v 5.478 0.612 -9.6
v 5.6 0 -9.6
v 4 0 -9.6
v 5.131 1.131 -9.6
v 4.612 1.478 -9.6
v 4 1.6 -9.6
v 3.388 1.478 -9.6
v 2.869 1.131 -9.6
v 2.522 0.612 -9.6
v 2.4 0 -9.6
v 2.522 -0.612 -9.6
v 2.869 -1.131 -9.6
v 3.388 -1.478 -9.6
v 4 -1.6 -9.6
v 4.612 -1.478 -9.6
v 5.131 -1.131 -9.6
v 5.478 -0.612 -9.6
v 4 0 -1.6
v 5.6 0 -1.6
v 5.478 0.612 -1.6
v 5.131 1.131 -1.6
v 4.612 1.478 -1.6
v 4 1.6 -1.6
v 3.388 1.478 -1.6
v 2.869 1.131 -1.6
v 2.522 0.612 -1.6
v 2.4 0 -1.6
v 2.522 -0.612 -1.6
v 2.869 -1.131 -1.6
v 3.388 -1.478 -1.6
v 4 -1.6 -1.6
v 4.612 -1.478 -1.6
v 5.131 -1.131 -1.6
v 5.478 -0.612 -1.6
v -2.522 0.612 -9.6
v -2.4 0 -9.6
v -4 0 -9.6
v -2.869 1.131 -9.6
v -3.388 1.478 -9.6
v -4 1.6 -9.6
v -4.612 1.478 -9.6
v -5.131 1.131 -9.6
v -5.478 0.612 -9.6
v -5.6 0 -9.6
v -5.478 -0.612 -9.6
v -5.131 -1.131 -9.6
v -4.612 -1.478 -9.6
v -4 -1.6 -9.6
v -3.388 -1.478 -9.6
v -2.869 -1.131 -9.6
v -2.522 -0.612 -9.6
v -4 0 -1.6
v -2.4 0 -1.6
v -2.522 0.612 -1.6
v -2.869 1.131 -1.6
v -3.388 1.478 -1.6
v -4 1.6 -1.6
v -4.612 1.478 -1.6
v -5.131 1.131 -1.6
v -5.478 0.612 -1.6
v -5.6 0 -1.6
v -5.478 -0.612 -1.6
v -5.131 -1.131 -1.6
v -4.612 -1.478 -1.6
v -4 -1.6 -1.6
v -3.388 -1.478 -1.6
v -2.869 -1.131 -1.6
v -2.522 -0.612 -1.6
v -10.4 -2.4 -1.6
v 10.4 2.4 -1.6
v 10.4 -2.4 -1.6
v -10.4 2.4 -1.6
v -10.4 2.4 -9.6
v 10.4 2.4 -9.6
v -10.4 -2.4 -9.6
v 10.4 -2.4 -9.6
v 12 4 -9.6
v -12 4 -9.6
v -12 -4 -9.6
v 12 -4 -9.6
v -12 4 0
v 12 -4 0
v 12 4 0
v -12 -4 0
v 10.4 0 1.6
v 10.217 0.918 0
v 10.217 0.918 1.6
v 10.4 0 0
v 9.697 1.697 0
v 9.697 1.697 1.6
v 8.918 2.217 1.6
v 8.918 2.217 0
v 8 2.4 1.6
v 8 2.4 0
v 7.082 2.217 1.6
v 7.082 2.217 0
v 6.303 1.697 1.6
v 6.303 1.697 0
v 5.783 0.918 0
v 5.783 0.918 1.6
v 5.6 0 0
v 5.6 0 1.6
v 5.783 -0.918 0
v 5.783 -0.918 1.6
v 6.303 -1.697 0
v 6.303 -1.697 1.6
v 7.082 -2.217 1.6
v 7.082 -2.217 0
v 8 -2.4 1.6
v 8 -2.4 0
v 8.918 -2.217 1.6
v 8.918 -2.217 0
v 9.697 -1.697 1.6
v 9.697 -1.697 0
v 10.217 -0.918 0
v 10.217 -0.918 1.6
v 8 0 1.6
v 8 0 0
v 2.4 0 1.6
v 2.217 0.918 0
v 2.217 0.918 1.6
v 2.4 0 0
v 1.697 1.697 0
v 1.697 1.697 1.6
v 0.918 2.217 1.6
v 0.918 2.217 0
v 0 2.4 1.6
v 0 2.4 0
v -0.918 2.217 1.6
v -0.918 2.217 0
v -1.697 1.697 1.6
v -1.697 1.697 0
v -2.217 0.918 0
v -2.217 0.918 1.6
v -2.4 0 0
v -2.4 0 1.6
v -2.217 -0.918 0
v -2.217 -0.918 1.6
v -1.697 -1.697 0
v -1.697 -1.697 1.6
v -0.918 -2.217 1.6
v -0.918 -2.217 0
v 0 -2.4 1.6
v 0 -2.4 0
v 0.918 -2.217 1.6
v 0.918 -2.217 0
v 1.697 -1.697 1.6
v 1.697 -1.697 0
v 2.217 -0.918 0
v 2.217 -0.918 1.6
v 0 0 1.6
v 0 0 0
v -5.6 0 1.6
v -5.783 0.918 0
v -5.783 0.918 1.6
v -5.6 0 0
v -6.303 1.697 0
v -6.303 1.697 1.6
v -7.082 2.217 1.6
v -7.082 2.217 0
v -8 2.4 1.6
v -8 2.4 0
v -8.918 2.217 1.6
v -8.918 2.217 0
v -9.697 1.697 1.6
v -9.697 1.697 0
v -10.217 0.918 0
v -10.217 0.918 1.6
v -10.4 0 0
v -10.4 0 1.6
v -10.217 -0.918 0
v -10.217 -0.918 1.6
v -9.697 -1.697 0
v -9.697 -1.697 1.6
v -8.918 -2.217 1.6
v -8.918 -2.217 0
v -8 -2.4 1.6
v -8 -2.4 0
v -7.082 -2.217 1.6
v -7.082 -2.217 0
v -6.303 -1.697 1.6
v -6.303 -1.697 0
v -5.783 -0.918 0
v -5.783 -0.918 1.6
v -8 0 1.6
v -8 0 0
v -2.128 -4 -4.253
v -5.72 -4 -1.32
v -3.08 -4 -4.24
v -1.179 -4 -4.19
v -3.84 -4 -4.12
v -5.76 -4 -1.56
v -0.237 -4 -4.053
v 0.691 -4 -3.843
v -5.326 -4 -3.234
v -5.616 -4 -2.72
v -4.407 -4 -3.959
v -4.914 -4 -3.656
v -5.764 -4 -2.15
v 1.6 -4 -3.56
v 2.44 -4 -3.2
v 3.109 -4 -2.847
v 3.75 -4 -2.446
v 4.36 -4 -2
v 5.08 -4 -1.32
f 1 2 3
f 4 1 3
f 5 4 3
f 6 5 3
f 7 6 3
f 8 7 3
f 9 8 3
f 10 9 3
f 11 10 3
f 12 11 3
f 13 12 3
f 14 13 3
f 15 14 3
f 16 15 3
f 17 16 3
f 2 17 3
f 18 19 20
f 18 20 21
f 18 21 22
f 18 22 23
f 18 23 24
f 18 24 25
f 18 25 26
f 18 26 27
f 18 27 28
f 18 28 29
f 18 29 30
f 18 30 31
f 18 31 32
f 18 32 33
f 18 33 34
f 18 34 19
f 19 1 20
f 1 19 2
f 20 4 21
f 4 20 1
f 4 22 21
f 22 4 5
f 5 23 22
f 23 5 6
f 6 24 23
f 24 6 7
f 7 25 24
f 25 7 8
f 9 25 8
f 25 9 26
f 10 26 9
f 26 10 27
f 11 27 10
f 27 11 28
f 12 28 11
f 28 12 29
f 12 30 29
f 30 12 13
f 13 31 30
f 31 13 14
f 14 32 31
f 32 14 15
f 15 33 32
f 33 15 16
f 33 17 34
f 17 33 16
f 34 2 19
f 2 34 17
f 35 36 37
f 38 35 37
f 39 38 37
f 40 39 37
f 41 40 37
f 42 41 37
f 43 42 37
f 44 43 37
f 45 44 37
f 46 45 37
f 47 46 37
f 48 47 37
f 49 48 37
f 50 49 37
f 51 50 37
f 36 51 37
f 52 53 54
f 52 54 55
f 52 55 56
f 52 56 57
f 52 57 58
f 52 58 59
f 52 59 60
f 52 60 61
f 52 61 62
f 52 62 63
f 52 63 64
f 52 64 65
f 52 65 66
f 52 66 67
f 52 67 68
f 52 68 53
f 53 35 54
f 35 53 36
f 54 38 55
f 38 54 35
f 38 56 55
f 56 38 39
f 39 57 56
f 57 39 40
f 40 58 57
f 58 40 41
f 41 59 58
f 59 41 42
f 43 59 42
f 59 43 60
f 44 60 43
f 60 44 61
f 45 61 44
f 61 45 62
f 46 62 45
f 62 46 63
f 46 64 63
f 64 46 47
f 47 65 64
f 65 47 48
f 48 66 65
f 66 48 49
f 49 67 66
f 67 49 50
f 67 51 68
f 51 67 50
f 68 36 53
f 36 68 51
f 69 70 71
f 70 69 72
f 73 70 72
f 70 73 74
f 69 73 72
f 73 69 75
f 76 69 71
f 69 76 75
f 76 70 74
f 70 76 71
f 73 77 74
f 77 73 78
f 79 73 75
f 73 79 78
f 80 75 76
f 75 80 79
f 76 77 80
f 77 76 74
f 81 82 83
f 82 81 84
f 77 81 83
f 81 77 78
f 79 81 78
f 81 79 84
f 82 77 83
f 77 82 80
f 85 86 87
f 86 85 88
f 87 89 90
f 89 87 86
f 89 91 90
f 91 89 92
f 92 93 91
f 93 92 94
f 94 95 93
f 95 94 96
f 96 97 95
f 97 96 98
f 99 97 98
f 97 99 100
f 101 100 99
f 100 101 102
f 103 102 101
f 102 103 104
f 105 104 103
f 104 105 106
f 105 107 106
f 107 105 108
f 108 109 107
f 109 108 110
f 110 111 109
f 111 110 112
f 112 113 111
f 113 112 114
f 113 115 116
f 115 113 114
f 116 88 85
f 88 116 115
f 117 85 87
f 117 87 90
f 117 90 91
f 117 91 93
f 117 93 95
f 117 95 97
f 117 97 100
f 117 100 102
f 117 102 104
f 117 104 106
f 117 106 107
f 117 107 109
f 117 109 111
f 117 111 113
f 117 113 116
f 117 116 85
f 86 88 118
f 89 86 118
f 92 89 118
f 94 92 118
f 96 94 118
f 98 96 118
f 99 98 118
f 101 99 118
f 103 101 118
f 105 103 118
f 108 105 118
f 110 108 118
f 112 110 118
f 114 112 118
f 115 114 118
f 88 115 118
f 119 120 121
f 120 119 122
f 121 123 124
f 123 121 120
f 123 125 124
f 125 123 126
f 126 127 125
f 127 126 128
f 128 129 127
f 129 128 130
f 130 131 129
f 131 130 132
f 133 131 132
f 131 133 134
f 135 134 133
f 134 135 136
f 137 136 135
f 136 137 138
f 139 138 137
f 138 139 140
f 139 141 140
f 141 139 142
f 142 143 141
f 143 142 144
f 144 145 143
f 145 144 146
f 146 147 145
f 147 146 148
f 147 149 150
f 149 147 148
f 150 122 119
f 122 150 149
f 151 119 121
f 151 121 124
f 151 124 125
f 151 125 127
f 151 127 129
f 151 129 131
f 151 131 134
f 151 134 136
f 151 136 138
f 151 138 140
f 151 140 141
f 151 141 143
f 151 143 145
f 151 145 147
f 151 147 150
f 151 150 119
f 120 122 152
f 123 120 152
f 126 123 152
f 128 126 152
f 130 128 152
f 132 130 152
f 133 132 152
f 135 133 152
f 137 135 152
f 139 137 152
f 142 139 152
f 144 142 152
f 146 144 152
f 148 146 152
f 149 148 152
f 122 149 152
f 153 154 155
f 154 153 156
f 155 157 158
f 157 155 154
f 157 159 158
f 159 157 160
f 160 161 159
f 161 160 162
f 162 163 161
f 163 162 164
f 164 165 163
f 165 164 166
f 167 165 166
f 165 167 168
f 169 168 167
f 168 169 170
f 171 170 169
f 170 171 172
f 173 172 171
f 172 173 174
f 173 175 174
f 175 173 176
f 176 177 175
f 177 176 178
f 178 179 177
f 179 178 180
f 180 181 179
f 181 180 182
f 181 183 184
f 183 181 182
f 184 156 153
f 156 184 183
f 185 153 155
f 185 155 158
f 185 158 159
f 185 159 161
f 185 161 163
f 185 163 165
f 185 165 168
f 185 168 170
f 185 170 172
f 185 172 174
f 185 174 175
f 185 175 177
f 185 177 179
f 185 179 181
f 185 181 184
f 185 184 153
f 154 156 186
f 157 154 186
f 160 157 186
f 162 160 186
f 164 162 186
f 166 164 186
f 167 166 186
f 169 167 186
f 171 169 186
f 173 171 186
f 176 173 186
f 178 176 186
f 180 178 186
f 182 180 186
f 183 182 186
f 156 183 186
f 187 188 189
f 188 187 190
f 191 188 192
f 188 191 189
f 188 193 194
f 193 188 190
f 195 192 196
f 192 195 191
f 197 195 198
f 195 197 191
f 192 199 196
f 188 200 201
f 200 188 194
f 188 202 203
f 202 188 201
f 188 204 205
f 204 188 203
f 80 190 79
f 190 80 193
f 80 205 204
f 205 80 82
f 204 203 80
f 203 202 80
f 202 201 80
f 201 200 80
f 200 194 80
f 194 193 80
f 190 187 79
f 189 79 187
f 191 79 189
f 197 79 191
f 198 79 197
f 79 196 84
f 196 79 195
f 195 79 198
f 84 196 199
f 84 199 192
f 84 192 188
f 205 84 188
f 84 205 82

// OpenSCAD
// file: ../p/4-4edge.scad
use <../lib.scad>
function ldraw_lib__4_4edge() = [
// 0 Circle 1.0
// 0 Name: 4-4edge.dat
// 0 Author: James Jessiman
// 0 !LDRAW_ORG Primitive UPDATE 2017-01
// 0 !LICENSE Licensed under CC BY 2.0 and CC BY 4.0 : see CAreadme.txt
// 
// 0 BFC CERTIFY CCW
  [0,"BFC","CERTIFY"],
  [0,"BFC","CCW"],
// 
// 0 !HISTORY 1998-12-15 [PTadmin] Official Update 1998-10
// 0 !HISTORY 2005-12-28 [PTadmin] Official Update 2005-01
// 0 !HISTORY 2007-06-24 [PTadmin] Header formatted for Contributor Agreement
// 0 !HISTORY 2008-07-01 [PTadmin] Official Update 2008-01
// 0 !HISTORY 2017-01-15 [Steffen] BFCed
// 0 !HISTORY 2017-12-30 [PTadmin] Official Update 2017-01
// 
// 
// 2 24 1 0 0 0.9239 0 0.3827
  [2,24,1,0,0,0.9239,0,0.3827],
// 2 24 0.9239 0 0.3827 0.7071 0 0.7071
  [2,24,0.9239,0,0.3827,0.7071,0,0.7071],
// 2 24 0.7071 0 0.7071 0.3827 0 0.9239
  [2,24,0.7071,0,0.7071,0.3827,0,0.9239],
// 2 24 0.3827 0 0.9239 0 0 1
  [2,24,0.3827,0,0.9239,0,0,1],
// 2 24 0 0 1 -0.3827 0 0.9239
  [2,24,0,0,1,-0.3827,0,0.9239],
// 2 24 -0.3827 0 0.9239 -0.7071 0 0.7071
  [2,24,-0.3827,0,0.9239,-0.7071,0,0.7071],
// 2 24 -0.7071 0 0.7071 -0.9239 0 0.3827
  [2,24,-0.7071,0,0.7071,-0.9239,0,0.3827],
// 2 24 -0.9239 0 0.3827 -1 0 -0
  [2,24,-0.9239,0,0.3827,-1,0,-0],
// 2 24 -1 0 -0 -0.9239 0 -0.3827
  [2,24,-1,0,-0,-0.9239,0,-0.3827],
// 2 24 -0.9239 0 -0.3827 -0.7071 0 -0.7071
  [2,24,-0.9239,0,-0.3827,-0.7071,0,-0.7071],
// 2 24 -0.7071 0 -0.7071 -0.3827 0 -0.9239
  [2,24,-0.7071,0,-0.7071,-0.3827,0,-0.9239],
// 2 24 -0.3827 0 -0.9239 0 0 -1
  [2,24,-0.3827,0,-0.9239,0,0,-1],
// 2 24 0 0 -1 0.3827 0 -0.9239
  [2,24,0,0,-1,0.3827,0,-0.9239],
// 2 24 0.3827 0 -0.9239 0.7071 0 -0.7071
  [2,24,0.3827,0,-0.9239,0.7071,0,-0.7071],
// 2 24 0.7071 0 -0.7071 0.9239 0 -0.3827
  [2,24,0.7071,0,-0.7071,0.9239,0,-0.3827],
// 2 24 0.9239 0 -0.3827 1 0 0
  [2,24,0.9239,0,-0.3827,1,0,0],
];
module ldraw_lib__4_4edge(step=0, col=false, unit=2/5, alt=false, line=0.2, solid=!$preview)
    makepoly(ldraw_lib__4_4edge(), step=step, col=col, unit=unit, alt=alt, line=line, solid=solid);
ldraw_lib__4_4edge(line=0.2);
// file: ../p/4-4disc.scad
use <../lib.scad>
function ldraw_lib__4_4disc() = [
// 0 Disc 1.0
// 0 Name: 4-4disc.dat
// 0 Author: James Jessiman
// 0 !LDRAW_ORG Primitive UPDATE 2002-02
// 0 !LICENSE Licensed under CC BY 2.0 and CC BY 4.0 : see CAreadme.txt
// 
// 0 BFC CERTIFY CCW
  [0,"BFC","CERTIFY"],
  [0,"BFC","CCW"],
// 
// 0 !HISTORY 1998-12-15 [PTadmin] Official Update 1998-10
// 0 !HISTORY 2002-03-23 [sbliss] Added BFC statement
// 0 !HISTORY 2002-04-25 [PTadmin] Official Update 2002-02
// 0 !HISTORY 2007-06-24 [PTadmin] Header formatted for Contributor Agreement
// 0 !HISTORY 2008-07-01 [PTadmin] Official Update 2008-01
// 
// 
// 3 16 0 0 0 1 0 0 0.9239 0 0.3827
  [3,16,0,0,0,1,0,0,0.9239,0,0.3827],
// 3 16 0 0 0 0.9239 0 0.3827 0.7071 0 0.7071
  [3,16,0,0,0,0.9239,0,0.3827,0.7071,0,0.7071],
// 3 16 0 0 0 0.7071 0 0.7071 0.3827 0 0.9239
  [3,16,0,0,0,0.7071,0,0.7071,0.3827,0,0.9239],
// 3 16 0 0 0 0.3827 0 0.9239 0 0 1
  [3,16,0,0,0,0.3827,0,0.9239,0,0,1],
// 3 16 0 0 0 0 0 1 -0.3827 0 0.9239
  [3,16,0,0,0,0,0,1,-0.3827,0,0.9239],
// 3 16 0 0 0 -0.3827 0 0.9239 -0.7071 0 0.7071
  [3,16,0,0,0,-0.3827,0,0.9239,-0.7071,0,0.7071],
// 3 16 0 0 0 -0.7071 0 0.7071 -0.9239 0 0.3827
  [3,16,0,0,0,-0.7071,0,0.7071,-0.9239,0,0.3827],
// 3 16 0 0 0 -0.9239 0 0.3827 -1 0 -0
  [3,16,0,0,0,-0.9239,0,0.3827,-1,0,-0],
// 3 16 0 0 0 -1 0 -0 -0.9239 0 -0.3827
  [3,16,0,0,0,-1,0,-0,-0.9239,0,-0.3827],
// 3 16 0 0 0 -0.9239 0 -0.3827 -0.7071 0 -0.7071
  [3,16,0,0,0,-0.9239,0,-0.3827,-0.7071,0,-0.7071],
// 3 16 0 0 0 -0.7071 0 -0.7071 -0.3827 0 -0.9239
  [3,16,0,0,0,-0.7071,0,-0.7071,-0.3827,0,-0.9239],
// 3 16 0 0 0 -0.3827 0 -0.9239 0 0 -1
  [3,16,0,0,0,-0.3827,0,-0.9239,0,0,-1],
// 3 16 0 0 0 0 0 -1 0.3827 0 -0.9239
  [3,16,0,0,0,0,0,-1,0.3827,0,-0.9239],
// 3 16 0 0 0 0.3827 0 -0.9239 0.7071 0 -0.7071
  [3,16,0,0,0,0.3827,0,-0.9239,0.7071,0,-0.7071],
// 3 16 0 0 0 0.7071 0 -0.7071 0.9239 0 -0.3827
  [3,16,0,0,0,0.7071,0,-0.7071,0.9239,0,-0.3827],
// 3 16 0 0 0 0.9239 0 -0.3827 1 0 0
  [3,16,0,0,0,0.9239,0,-0.3827,1,0,0],
// 0
];
module ldraw_lib__4_4disc(step=0, col=false, unit=2/5, alt=false, line=0.2, solid=!$preview)
    makepoly(ldraw_lib__4_4disc(), step=step, col=col, unit=unit, alt=alt, line=line, solid=solid);
ldraw_lib__4_4disc(line=0.2);
// file: ../p/4-4cyli.scad
use <../lib.scad>
$fa=1; $fs=0.2;
function ldraw_lib__4_4cyli(realsolid=false) = [
// 0 Cylinder 1.0
// 0 Name: 4-4cyli.dat
// 0 Author: James Jessiman
// 0 !LDRAW_ORG Primitive UPDATE 2005-01
// 0 !LICENSE Licensed under CC BY 2.0 and CC BY 4.0 : see CAreadme.txt
// 
// 0 BFC CERTIFY CCW
  [0,"BFC","CERTIFY"],
  [0,"BFC","CCW"],
// 
// 0 !HISTORY 1998-12-15 [PTadmin] Official Update 1998-10
// 0 !HISTORY 2002-03-23 [sbliss] Added BFC statement; merged headers from files in distributions LDraw 0.27 and Complete.
// 0 !HISTORY 2002-04-25 [PTadmin] Official Update 2002-02
// 0 !HISTORY 2004-12-14 [guyvivan] BFC CCW
// 0 !HISTORY 2005-12-28 [PTadmin] Official Update 2005-01
// 0 !HISTORY 2007-06-24 [PTadmin] Header formatted for Contributor Agreement
// 0 !HISTORY 2008-07-01 [PTadmin] Official Update 2008-01
// 
// 
// 4 16 1 1 0 0.9239 1 0.3827 0.9239 0 0.3827 1 0 0
  [4,16,1,1,0,0.9239,1,0.3827,0.9239,0,0.3827,1,0,0],
// 5 24 1 0 0 1 1 0 0.9239 0 0.3827 0.9239 0 -0.3827
  [5,24,1,0,0,1,1,0,0.9239,0,0.3827,0.9239,0,-0.3827],
// 4 16 0.9239 1 0.3827 0.7071 1 0.7071 0.7071 0 0.7071 0.9239 0 0.3827
  [4,16,0.9239,1,0.3827,0.7071,1,0.7071,0.7071,0,0.7071,0.9239,0,0.3827],
// 5 24 0.9239 0 0.3827 0.9239 1 0.3827 0.7071 0 0.7071 1 0 0
  [5,24,0.9239,0,0.3827,0.9239,1,0.3827,0.7071,0,0.7071,1,0,0],
// 4 16 0.7071 1 0.7071 0.3827 1 0.9239 0.3827 0 0.9239 0.7071 0 0.7071
  [4,16,0.7071,1,0.7071,0.3827,1,0.9239,0.3827,0,0.9239,0.7071,0,0.7071],
// 5 24 0.7071 0 0.7071 0.7071 1 0.7071 0.3827 0 0.9239 0.9239 0 0.3827
  [5,24,0.7071,0,0.7071,0.7071,1,0.7071,0.3827,0,0.9239,0.9239,0,0.3827],
// 4 16 0.3827 1 0.9239 0 1 1 0 0 1 0.3827 0 0.9239
  [4,16,0.3827,1,0.9239,0,1,1,0,0,1,0.3827,0,0.9239],
// 5 24 0.3827 0 0.9239 0.3827 1 0.9239 0 0 1 0.7071 0 0.7071
  [5,24,0.3827,0,0.9239,0.3827,1,0.9239,0,0,1,0.7071,0,0.7071],
// 4 16 0 1 1 -0.3827 1 0.9239 -0.3827 0 0.9239 0 0 1
  [4,16,0,1,1,-0.3827,1,0.9239,-0.3827,0,0.9239,0,0,1],
// 5 24 0 0 1 0 1 1 -0.3827 0 0.9239 0.3827 0 0.9239
  [5,24,0,0,1,0,1,1,-0.3827,0,0.9239,0.3827,0,0.9239],
// 4 16 -0.3827 1 0.9239 -0.7071 1 0.7071 -0.7071 0 0.7071 -0.3827 0 0.9239
  [4,16,-0.3827,1,0.9239,-0.7071,1,0.7071,-0.7071,0,0.7071,-0.3827,0,0.9239],
// 5 24 -0.3827 0 0.9239 -0.3827 1 0.9239 -0.7071 0 0.7071 0 0 1
  [5,24,-0.3827,0,0.9239,-0.3827,1,0.9239,-0.7071,0,0.7071,0,0,1],
// 4 16 -0.7071 1 0.7071 -0.9239 1 0.3827 -0.9239 0 0.3827 -0.7071 0 0.7071
  [4,16,-0.7071,1,0.7071,-0.9239,1,0.3827,-0.9239,0,0.3827,-0.7071,0,0.7071],
// 5 24 -0.7071 0 0.7071 -0.7071 1 0.7071 -0.9239 0 0.3827 -0.3827 0 0.9239
  [5,24,-0.7071,0,0.7071,-0.7071,1,0.7071,-0.9239,0,0.3827,-0.3827,0,0.9239],
// 4 16 -0.9239 1 0.3827 -1 1 0 -1 0 0 -0.9239 0 0.3827
  [4,16,-0.9239,1,0.3827,-1,1,0,-1,0,0,-0.9239,0,0.3827],
// 5 24 -0.9239 0 0.3827 -0.9239 1 0.3827 -1 0 0 -0.7071 0 0.7071
  [5,24,-0.9239,0,0.3827,-0.9239,1,0.3827,-1,0,0,-0.7071,0,0.7071],
// 4 16 -1 1 0 -0.9239 1 -0.3827 -0.9239 0 -0.3827 -1 0 0
  [4,16,-1,1,0,-0.9239,1,-0.3827,-0.9239,0,-0.3827,-1,0,0],
// 5 24 -1 0 0 -1 1 0 -0.9239 0 -0.3827 -0.9239 0 0.3827
  [5,24,-1,0,0,-1,1,0,-0.9239,0,-0.3827,-0.9239,0,0.3827],
// 4 16 -0.9239 1 -0.3827 -0.7071 1 -0.7071 -0.7071 0 -0.7071 -0.9239 0 -0.3827
  [4,16,-0.9239,1,-0.3827,-0.7071,1,-0.7071,-0.7071,0,-0.7071,-0.9239,0,-0.3827],
// 5 24 -0.9239 0 -0.3827 -0.9239 1 -0.3827 -0.7071 0 -0.7071 -1 0 0
  [5,24,-0.9239,0,-0.3827,-0.9239,1,-0.3827,-0.7071,0,-0.7071,-1,0,0],
// 4 16 -0.7071 1 -0.7071 -0.3827 1 -0.9239 -0.3827 0 -0.9239 -0.7071 0 -0.7071
  [4,16,-0.7071,1,-0.7071,-0.3827,1,-0.9239,-0.3827,0,-0.9239,-0.7071,0,-0.7071],
// 5 24 -0.7071 0 -0.7071 -0.7071 1 -0.7071 -0.3827 0 -0.9239 -0.9239 0 -0.3827
  [5,24,-0.7071,0,-0.7071,-0.7071,1,-0.7071,-0.3827,0,-0.9239,-0.9239,0,-0.3827],
// 4 16 -0.3827 1 -0.9239 0 1 -1 0 0 -1 -0.3827 0 -0.9239
  [4,16,-0.3827,1,-0.9239,0,1,-1,0,0,-1,-0.3827,0,-0.9239],
// 5 24 -0.3827 0 -0.9239 -0.3827 1 -0.9239 0 0 -1 -0.7071 0 -0.7071
  [5,24,-0.3827,0,-0.9239,-0.3827,1,-0.9239,0,0,-1,-0.7071,0,-0.7071],
// 4 16 0 1 -1 0.3827 1 -0.9239 0.3827 0 -0.9239 0 0 -1
  [4,16,0,1,-1,0.3827,1,-0.9239,0.3827,0,-0.9239,0,0,-1],
// 5 24 0 0 -1 0 1 -1 0.3827 0 -0.9239 -0.3827 0 -0.9239
  [5,24,0,0,-1,0,1,-1,0.3827,0,-0.9239,-0.3827,0,-0.9239],
// 4 16 0.3827 1 -0.9239 0.7071 1 -0.7071 0.7071 0 -0.7071 0.3827 0 -0.9239
  [4,16,0.3827,1,-0.9239,0.7071,1,-0.7071,0.7071,0,-0.7071,0.3827,0,-0.9239],
// 5 24 0.3827 0 -0.9239 0.3827 1 -0.9239 0.7071 0 -0.7071 0 0 -1
  [5,24,0.3827,0,-0.9239,0.3827,1,-0.9239,0.7071,0,-0.7071,0,0,-1],
// 4 16 0.7071 1 -0.7071 0.9239 1 -0.3827 0.9239 0 -0.3827 0.7071 0 -0.7071
  [4,16,0.7071,1,-0.7071,0.9239,1,-0.3827,0.9239,0,-0.3827,0.7071,0,-0.7071],
// 5 24 0.7071 0 -0.7071 0.7071 1 -0.7071 0.9239 0 -0.3827 0.3827 0 -0.9239
  [5,24,0.7071,0,-0.7071,0.7071,1,-0.7071,0.9239,0,-0.3827,0.3827,0,-0.9239],
// 4 16 0.9239 1 -0.3827 1 1 0 1 0 0 0.9239 0 -0.3827
  [4,16,0.9239,1,-0.3827,1,1,0,1,0,0,0.9239,0,-0.3827],
// 5 24 0.9239 0 -0.3827 0.9239 1 -0.3827 1 0 0 0.7071 0 -0.7071
  [5,24,0.9239,0,-0.3827,0.9239,1,-0.3827,1,0,0,0.7071,0,-0.7071],
// 0
];
module ldraw_lib__4_4cyli(step=0, col=false, unit=2/5, alt=false, line=0.2, solid=!$preview)
    makepoly(ldraw_lib__4_4cyli(solid), step=step, col=col, unit=unit, alt=alt, line=line, solid=solid);
ldraw_lib__4_4cyli(line=0.2);
// file: ../p/stud3.scad
use <../lib.scad>
use <4-4cyli.scad>
use <4-4disc.scad>
use <4-4edge.scad>
function ldraw_lib__stud3() = [
// 0 Stud Tube Solid
// 0 Name: stud3.dat
// 0 Author: James Jessiman
// 0 !LDRAW_ORG Primitive UPDATE 2012-01
// 0 !LICENSE Licensed under CC BY 4.0 : see CAreadme.txt
// 
// 0 BFC CERTIFY CCW
  [0,"BFC","CERTIFY"],
  [0,"BFC","CCW"],
// 
// 0 !HISTORY 2002-04-04 [sbliss] Modified for BFC compliance
// 0 !HISTORY 2002-04-25 [PTadmin] Official Update 2002-02
// 0 !HISTORY 2007-06-24 [PTadmin] Header formatted for Contributor Agreement
// 0 !HISTORY 2008-07-01 [PTadmin] Official Update 2008-01
// 0 !HISTORY 2012-02-16 [Philo] Changed to CCW
// 0 !HISTORY 2012-03-30 [PTadmin] Official Update 2012-01
// 
// 
// 1 16 0 -4 0 4 0 0 0 1 0 0 0 4 4-4edge.dat
  [1,16,0,-4,0,4,0,0,0,1,0,0,0,4, ldraw_lib__4_4edge()],
// 1 16 0 0 0 4 0 0 0 1 0 0 0 4 4-4edge.dat
  [1,16,0,0,0,4,0,0,0,1,0,0,0,4, ldraw_lib__4_4edge()],
// 1 16 0 -4 0 4 0 0 0 1 0 0 0 4 4-4disc.dat
  [1,16,0,-4,0,4,0,0,0,1,0,0,0,4, ldraw_lib__4_4disc()],
  [-1,16,0,0,0,4,0,0,0,-1,0,0,0,4, ldraw_lib__4_4disc()],
// 1 16 0 -4 0 4 0 0 0 4 0 0 0 4 4-4cyli.dat
  [1,16,0,-4,0,4,0,0,0,4,0,0,0,4, ldraw_lib__4_4cyli()],
];
module ldraw_lib__stud3(step=0, col=false, unit=2/5, alt=false, line=0.2, solid=!$preview)
    makepoly(ldraw_lib__stud3(), step=step, col=col, unit=unit, alt=alt, line=line, solid=solid);
ldraw_lib__stud3(line=0.2);
// file: ../p/stud.scad
use <../lib.scad>
use <4-4cyli.scad>
use <4-4disc.scad>
use <4-4edge.scad>
function ldraw_lib__stud() = [
// 0 Stud
// 0 Name: stud.dat
// 0 Author: James Jessiman
// 0 !LDRAW_ORG Primitive UPDATE 2012-01
// 0 !LICENSE Licensed under CC BY 4.0 : see CAreadme.txt
// 
// 0 BFC CERTIFY CCW
  [0,"BFC","CERTIFY"],
  [0,"BFC","CCW"],
// 
// 0 !HISTORY 2002-04-04 [sbliss] Modified for BFC compliance
// 0 !HISTORY 2002-04-25 [PTadmin] Official Update 2002-02
// 0 !HISTORY 2007-06-24 [PTadmin] Header formatted for Contributor Agreement
// 0 !HISTORY 2008-07-01 [PTadmin] Official Update 2008-01
// 0 !HISTORY 2012-02-16 [Philo] Changed to CCW
// 0 !HISTORY 2012-03-30 [PTadmin] Official Update 2012-01
// 
// 
// 1 16 0 0 0 6 0 0 0 1 0 0 0 6 4-4edge.dat
  [1,16,0,0,0,6,0,0,0,1,0,0,0,6, ldraw_lib__4_4edge()],
// 1 16 0 -4 0 6 0 0 0 1 0 0 0 6 4-4edge.dat
  [1,16,0,-4,0,6,0,0,0,1,0,0,0,6, ldraw_lib__4_4edge()],
// 1 16 0 0 0 6 0 0 0 -4 0 0 0 6 4-4cyli.dat
  [1,16,0,0,0,6,0,0,0,-4,0,0,0,6, ldraw_lib__4_4cyli()],
// 1 16 0 -4 0 6 0 0 0 1 0 0 0 6 4-4disc.dat
  [1,16,0,-4,0,6,0,0,0,1,0,0,0,6, ldraw_lib__4_4disc()],
  [-1,16,0,0,0,6,0,0,0,-1,0,0,0,6, ldraw_lib__4_4disc()],
];
module ldraw_lib__stud(step=0, col=false, unit=2/5, alt=false, line=0.2, solid=!$preview)
    makepoly(ldraw_lib__stud(), step=step, col=col, unit=unit, alt=alt, line=line, solid=solid);
ldraw_lib__stud(line=0.2);
// file: ../p/box5.scad
use <../lib.scad>
function ldraw_lib__box5() = [
// 0 Box with 5 Faces and All Edges
// 0 Name: box5.dat
// 0 Author: James Jessiman
// 0 !LDRAW_ORG Primitive UPDATE 2012-01
// 0 !LICENSE Licensed under CC BY 2.0 and CC BY 4.0 : see CAreadme.txt
// 
// 0 BFC CERTIFY CCW
  [0,"BFC","CERTIFY"],
  [0,"BFC","CCW"],
// 
// 0 !HISTORY 2002-04-03 [sbliss] Modified for BFC compliance
// 0 !HISTORY 2002-04-25 [PTadmin] Official Update 2002-02
// 0 !HISTORY 2007-06-24 [PTadmin] Header formatted for Contributor Agreement
// 0 !HISTORY 2008-07-01 [PTadmin] Official Update 2008-01
// 0 !HISTORY 2012-02-16 [Philo] Changed to CCW
// 0 !HISTORY 2012-03-30 [PTadmin] Official Update 2012-01
// 
// 
// 2 24 1 1 1 -1 1 1
  [2,24,1,1,1,-1,1,1],
// 2 24 -1 1 1 -1 1 -1
  [2,24,-1,1,1,-1,1,-1],
// 2 24 -1 1 -1 1 1 -1
  [2,24,-1,1,-1,1,1,-1],
// 2 24 1 1 -1 1 1 1
  [2,24,1,1,-1,1,1,1],
// 2 24 1 0 1 -1 0 1
  [2,24,1,0,1,-1,0,1],
// 2 24 -1 0 1 -1 0 -1
  [2,24,-1,0,1,-1,0,-1],
// 2 24 -1 0 -1 1 0 -1
  [2,24,-1,0,-1,1,0,-1],
// 2 24 1 0 -1 1 0 1
  [2,24,1,0,-1,1,0,1],
// 2 24 1 0 1 1 1 1
  [2,24,1,0,1,1,1,1],
// 2 24 -1 0 1 -1 1 1
  [2,24,-1,0,1,-1,1,1],
// 2 24 1 0 -1 1 1 -1
  [2,24,1,0,-1,1,1,-1],
// 2 24 -1 0 -1 -1 1 -1
  [2,24,-1,0,-1,-1,1,-1],
// 4 16 -1 1 1 1 1 1 1 1 -1 -1 1 -1
  [4,16,-1,1,1,1,1,1,1,1,-1,-1,1,-1],
// 4 16 -1 1 1 -1 0 1 1 0 1 1 1 1
  [4,16,-1,1,1,-1,0,1,1,0,1,1,1,1],
// 4 16 -1 1 -1 -1 0 -1 -1 0 1 -1 1 1
  [4,16,-1,1,-1,-1,0,-1,-1,0,1,-1,1,1],
// 4 16 1 1 -1 1 0 -1 -1 0 -1 -1 1 -1
  [4,16,1,1,-1,1,0,-1,-1,0,-1,-1,1,-1],
// 4 16 1 1 1 1 0 1 1 0 -1 1 1 -1
  [4,16,1,1,1,1,0,1,1,0,-1,1,1,-1],
];
makepoly(ldraw_lib__box5(), line=0.2);
// file: ../p/box4t.scad
use <../lib.scad>
function ldraw_lib__box4t() = [
// 0 Box with 4 Adjacent Faces and All Edges
// 0 Name: box4t.dat
// 0 Author: Tore Eriksson [Tore_Eriksson]
// 0 !LDRAW_ORG Primitive UPDATE 2003-02
// 0 !LICENSE Licensed under CC BY 2.0 and CC BY 4.0 : see CAreadme.txt
// 
// 0 BFC CERTIFY CCW
  [0,"BFC","CERTIFY"],
  [0,"BFC","CCW"],
// 
// 0 !HISTORY 1997-09-29 [PTadmin] Official Update 1997-15
// 0 !HISTORY 2002-08-31 [izanette] Modified with WINDZ for BFC compliance
// 0 !HISTORY 2003-08-01 [PTadmin] Official Update 2003-02
// 0 !HISTORY 2007-06-24 [PTadmin] Header formatted for Contributor Agreement
// 0 !HISTORY 2008-07-01 [PTadmin] Official Update 2008-01
// 
// 
// 2 24 1 1 1 -1 1 1
  [2,24,1,1,1,-1,1,1],
// 2 24 -1 1 1 -1 1 -1
  [2,24,-1,1,1,-1,1,-1],
// 2 24 -1 1 -1 1 1 -1
  [2,24,-1,1,-1,1,1,-1],
// 2 24 1 1 -1 1 1 1
  [2,24,1,1,-1,1,1,1],
// 2 24 1 0 1 -1 0 1
  [2,24,1,0,1,-1,0,1],
// 2 24 -1 0 1 -1 0 -1
  [2,24,-1,0,1,-1,0,-1],
// 2 24 -1 0 -1 1 0 -1
  [2,24,-1,0,-1,1,0,-1],
// 2 24 1 0 -1 1 0 1
  [2,24,1,0,-1,1,0,1],
// 2 24 1 0 1 1 1 1
  [2,24,1,0,1,1,1,1],
// 2 24 -1 0 1 -1 1 1
  [2,24,-1,0,1,-1,1,1],
// 2 24 1 0 -1 1 1 -1
  [2,24,1,0,-1,1,1,-1],
// 2 24 -1 0 -1 -1 1 -1
  [2,24,-1,0,-1,-1,1,-1],
// 4 16 1 1 1 1 1 -1 -1 1 -1 -1 1 1
  [4,16,1,1,1,1,1,-1,-1,1,-1,-1,1,1],
// 4 16 1 1 1 -1 1 1 -1 0 1 1 0 1
  [4,16,1,1,1,-1,1,1,-1,0,1,1,0,1],
// 4 16 -1 1 1 -1 1 -1 -1 0 -1 -1 0 1
  [4,16,-1,1,1,-1,1,-1,-1,0,-1,-1,0,1],
// 0 4 16 -1 1 -1 -1 0 -1 1 0 -1 1 1 -1
// 4 16 1 1 -1 1 1 1 1 0 1 1 0 -1
  [4,16,1,1,-1,1,1,1,1,0,1,1,0,-1],
// 0
];
makepoly(ldraw_lib__box4t(), line=0.2);
// file: s/3622s01.scad
use <../../lib.scad>
use <../../p/box4t.scad>
use <../../p/box5.scad>
use <../../p/stud.scad>
use <../../p/stud3.scad>
function ldraw_lib__s__3622s01() = [
// 0 ~Brick  1 x  3 without Front Face
// 0 Name: s\3622s01.dat
// 0 Author: Andy Westrate [westrate]
// 0 !LDRAW_ORG Subpart UPDATE 2004-02
// 0 !LICENSE Licensed under CC BY 2.0 and CC BY 4.0 : see CAreadme.txt
// 
// 0 BFC CERTIFY CCW
  [0,"BFC","CERTIFY"],
  [0,"BFC","CCW"],
// 
// 0 !HISTORY 2003-10-14 [westrate] Subfiled, BFC'd
// 0 !HISTORY 2004-04-22 [PTadmin] Official Update 2004-02
// 0 !HISTORY 2007-08-31 [PTadmin] Header formatted for Contributor Agreement
// 0 !HISTORY 2008-07-01 [PTadmin] Official Update 2008-01
// 
// 
// 0 // Uncomment the following for front face
// 0 // 4 16 30 0 -10 -30 0 -10 -30 24 -10 30 24 -10
// 1 16 10 4 0 1 0 0 0 -5 0 0 0 1 stud3.dat
  [1,16,10,4,0,1,0,0,0,-5,0,0,0,1, ldraw_lib__stud3()],
// 1 16 -10 4 0 1 0 0 0 -5 0 0 0 1 stud3.dat
  [1,16,-10,4,0,1,0,0,0,-5,0,0,0,1, ldraw_lib__stud3()],
// 
// 0 BFC INVERTNEXT
  [0,"BFC","INVERTNEXT"],
// 1 16 0 24 0 26 0 0 0 -20 0 0 0 6 box5.dat
  [1,16,0,24,0,26,0,0,0,-20,0,0,0,6, ldraw_lib__box5()],
// 
// 4 16 30 24 10 26 24 6 -26 24 6 -30 24 10
  [4,16,30,24,10,26,24,6,-26,24,6,-30,24,10],
// 4 16 -30 24 10 -26 24 6 -26 24 -6 -30 24 -10
  [4,16,-30,24,10,-26,24,6,-26,24,-6,-30,24,-10],
// 4 16 -30 24 -10 -26 24 -6 26 24 -6 30 24 -10
  [4,16,-30,24,-10,-26,24,-6,26,24,-6,30,24,-10],
// 4 16 30 24 -10 26 24 -6 26 24 6 30 24 10
  [4,16,30,24,-10,26,24,-6,26,24,6,30,24,10],
// 
// 1 16 0 24 0 30 0 0 0 -24 0 0 0 10 box4t.dat
  [1,16,0,24,0,30,0,0,0,-24,0,0,0,10, ldraw_lib__box4t()],
// 
// 1 16 20 0 0 1 0 0 0 1 0 0 0 1 stud.dat
  [1,16,20,0,0,1,0,0,0,1,0,0,0,1, ldraw_lib__stud()],
// 1 16 0 0 0 1 0 0 0 1 0 0 0 1 stud.dat
  [1,16,0,0,0,1,0,0,0,1,0,0,0,1, ldraw_lib__stud()],
// 1 16 -20 0 0 1 0 0 0 1 0 0 0 1 stud.dat
  [1,16,-20,0,0,1,0,0,0,1,0,0,0,1, ldraw_lib__stud()],
// 0
];
makepoly(ldraw_lib__s__3622s01(), line=0.2);
// main file
use <../lib.scad>
use <s/3622s01.scad>
function ldraw_lib__3622p0g() = [
// 0 Brick  1 x  3 with Black Curved Semicircle Pattern
// 0 Name: 3622p0g.dat
// 0 Author: Gabriel Läufer [Dr.Bricktacular]
// 0 !LDRAW_ORG Part UPDATE 2026-05
// 0 !LICENSE Licensed under CC BY 4.0 : see CAreadme.txt
// 
// 0 BFC CERTIFY CCW
  [0,"BFC","CERTIFY"],
  [0,"BFC","CCW"],
// 
// 0 !KEYWORDS Banarnar, BrickLink 3622pb102, Brickowl 708718, Brickset 52594
// 0 !KEYWORDS Introducing Queen Watevra Wa'Nabi, Mouth, Rebrickable 3622pr0049
// 0 !KEYWORDS set 70824, The LEGO Movie 2
// 
// 0 !HISTORY 2026-05-31 [OrionP] Official Update 2026-05
// 
// 0 // Pattern-Basepart
// 1 16 0 0 0 1 0 0 0 1 0 0 0 1 s\3622s01.dat
  [1,16,0,0,0,1,0,0,0,1,0,0,0,1, ldraw_lib__s__3622s01()],
// 
// 0 // Pattern
// 4 0 -5.3209 10.6314 -10 -2.9467 10.4756 -10 -14.3 3.3 -10 -7.7 10.6 -10
  [4,0,-5.3209,10.6314,-10,-2.9467,10.4756,-10,-14.3,3.3,-10,-7.7,10.6,-10],
// 4 0 -9.6 10.3 -10 -7.7 10.6 -10 -14.3 3.3 -10 -14.4 3.9 -10
  [4,0,-9.6,10.3,-10,-7.7,10.6,-10,-14.3,3.3,-10,-14.4,3.9,-10],
// 4 0 -14.3 3.3 -10 -2.9467 10.4756 -10 -.5921 10.1335 -10 1.7282 9.6072 -10
  [4,0,-14.3,3.3,-10,-2.9467,10.4756,-10,-.5921,10.1335,-10,1.7282,9.6072,-10],
// 4 0 -13.3139 8.0855 -10 -9.6 10.3 -10 -14.4 3.9 -10 -14.039 6.8012 -10
  [4,0,-13.3139,8.0855,-10,-9.6,10.3,-10,-14.4,3.9,-10,-14.039,6.8012,-10],
// 4 0 -9.6 10.3 -10 -13.3139 8.0855 -10 -12.2841 9.1411 -10 -11.0182 9.8976 -10
  [4,0,-9.6,10.3,-10,-13.3139,8.0855,-10,-12.2841,9.1411,-10,-11.0182,9.8976,-10],
// 3 0 -14.4 3.9 -10 -14.4107 5.3741 -10 -14.039 6.8012 -10
  [3,0,-14.4,3.9,-10,-14.4107,5.3741,-10,-14.039,6.8012,-10],
// 4 0 -14.3 3.3 -10 1.7282 9.6072 -10 4 8.9 -10 6.1 8 -10
  [4,0,-14.3,3.3,-10,1.7282,9.6072,-10,4,8.9,-10,6.1,8,-10],
// 4 0 -14.3 3.3 -10 6.1 8 -10 7.7716 7.1177 -10 9.3744 6.1159 -10
  [4,0,-14.3,3.3,-10,6.1,8,-10,7.7716,7.1177,-10,9.3744,6.1159,-10],
// 4 0 -14.3 3.3 -10 9.3744 6.1159 -10 10.9 5 -10 12.7 3.3 -10
  [4,0,-14.3,3.3,-10,9.3744,6.1159,-10,10.9,5,-10,12.7,3.3,-10],
// 4 16 -2.9467 10.4756 -10 -30 24 -10 30 24 -10 -.5921 10.1335 -10
  [4,16,-2.9467,10.4756,-10,-30,24,-10,30,24,-10,-.5921,10.1335,-10],
// 4 16 30 24 -10 30 0 -10 12.7 3.3 -10 10.9 5 -10
  [4,16,30,24,-10,30,0,-10,12.7,3.3,-10,10.9,5,-10],
// 3 16 10.9 5 -10 9.3744 6.1159 -10 30 24 -10
  [3,16,10.9,5,-10,9.3744,6.1159,-10,30,24,-10],
// 3 16 9.3744 6.1159 -10 7.7716 7.1177 -10 30 24 -10
  [3,16,9.3744,6.1159,-10,7.7716,7.1177,-10,30,24,-10],
// 3 16 7.7716 7.1177 -10 6.1 8 -10 30 24 -10
  [3,16,7.7716,7.1177,-10,6.1,8,-10,30,24,-10],
// 3 16 6.1 8 -10 4 8.9 -10 30 24 -10
  [3,16,6.1,8,-10,4,8.9,-10,30,24,-10],
// 3 16 4 8.9 -10 1.7282 9.6072 -10 30 24 -10
  [3,16,4,8.9,-10,1.7282,9.6072,-10,30,24,-10],
// 3 16 1.7282 9.6072 -10 -.5921 10.1335 -10 30 24 -10
  [3,16,1.7282,9.6072,-10,-.5921,10.1335,-10,30,24,-10],
// 3 16 -2.9467 10.4756 -10 -5.3209 10.6314 -10 -30 24 -10
  [3,16,-2.9467,10.4756,-10,-5.3209,10.6314,-10,-30,24,-10],
// 3 16 -7.7 10.6 -10 -30 24 -10 -5.3209 10.6314 -10
  [3,16,-7.7,10.6,-10,-30,24,-10,-5.3209,10.6314,-10],
// 3 16 -9.6 10.3 -10 -30 24 -10 -7.7 10.6 -10
  [3,16,-9.6,10.3,-10,-30,24,-10,-7.7,10.6,-10],
// 3 16 -11.0182 9.8976 -10 -30 24 -10 -9.6 10.3 -10
  [3,16,-11.0182,9.8976,-10,-30,24,-10,-9.6,10.3,-10],
// 3 16 -12.2841 9.1411 -10 -30 24 -10 -11.0182 9.8976 -10
  [3,16,-12.2841,9.1411,-10,-30,24,-10,-11.0182,9.8976,-10],
// 4 16 -14.039 6.8012 -10 -30 0 -10 -30 24 -10 -13.3139 8.0855 -10
  [4,16,-14.039,6.8012,-10,-30,0,-10,-30,24,-10,-13.3139,8.0855,-10],
// 3 16 -13.3139 8.0855 -10 -30 24 -10 -12.2841 9.1411 -10
  [3,16,-13.3139,8.0855,-10,-30,24,-10,-12.2841,9.1411,-10],
// 3 16 -30 0 -10 -14.039 6.8012 -10 -14.4107 5.3741 -10
  [3,16,-30,0,-10,-14.039,6.8012,-10,-14.4107,5.3741,-10],
// 3 16 -30 0 -10 -14.4107 5.3741 -10 -14.4 3.9 -10
  [3,16,-30,0,-10,-14.4107,5.3741,-10,-14.4,3.9,-10],
// 3 16 -30 0 -10 -14.4 3.9 -10 -14.3 3.3 -10
  [3,16,-30,0,-10,-14.4,3.9,-10,-14.3,3.3,-10],
// 4 16 -30 0 -10 -14.3 3.3 -10 12.7 3.3 -10 30 0 -10
  [4,16,-30,0,-10,-14.3,3.3,-10,12.7,3.3,-10,30,0,-10],
];
module ldraw_lib__3622p0g(step=0, col=false, unit=2/5, alt=false, line=0.2, solid=!$preview)
    makepoly(ldraw_lib__3622p0g(), step=step, col=col, unit=unit, alt=alt, line=line, solid=solid);
ldraw_lib__3622p0g(line=0.2);
